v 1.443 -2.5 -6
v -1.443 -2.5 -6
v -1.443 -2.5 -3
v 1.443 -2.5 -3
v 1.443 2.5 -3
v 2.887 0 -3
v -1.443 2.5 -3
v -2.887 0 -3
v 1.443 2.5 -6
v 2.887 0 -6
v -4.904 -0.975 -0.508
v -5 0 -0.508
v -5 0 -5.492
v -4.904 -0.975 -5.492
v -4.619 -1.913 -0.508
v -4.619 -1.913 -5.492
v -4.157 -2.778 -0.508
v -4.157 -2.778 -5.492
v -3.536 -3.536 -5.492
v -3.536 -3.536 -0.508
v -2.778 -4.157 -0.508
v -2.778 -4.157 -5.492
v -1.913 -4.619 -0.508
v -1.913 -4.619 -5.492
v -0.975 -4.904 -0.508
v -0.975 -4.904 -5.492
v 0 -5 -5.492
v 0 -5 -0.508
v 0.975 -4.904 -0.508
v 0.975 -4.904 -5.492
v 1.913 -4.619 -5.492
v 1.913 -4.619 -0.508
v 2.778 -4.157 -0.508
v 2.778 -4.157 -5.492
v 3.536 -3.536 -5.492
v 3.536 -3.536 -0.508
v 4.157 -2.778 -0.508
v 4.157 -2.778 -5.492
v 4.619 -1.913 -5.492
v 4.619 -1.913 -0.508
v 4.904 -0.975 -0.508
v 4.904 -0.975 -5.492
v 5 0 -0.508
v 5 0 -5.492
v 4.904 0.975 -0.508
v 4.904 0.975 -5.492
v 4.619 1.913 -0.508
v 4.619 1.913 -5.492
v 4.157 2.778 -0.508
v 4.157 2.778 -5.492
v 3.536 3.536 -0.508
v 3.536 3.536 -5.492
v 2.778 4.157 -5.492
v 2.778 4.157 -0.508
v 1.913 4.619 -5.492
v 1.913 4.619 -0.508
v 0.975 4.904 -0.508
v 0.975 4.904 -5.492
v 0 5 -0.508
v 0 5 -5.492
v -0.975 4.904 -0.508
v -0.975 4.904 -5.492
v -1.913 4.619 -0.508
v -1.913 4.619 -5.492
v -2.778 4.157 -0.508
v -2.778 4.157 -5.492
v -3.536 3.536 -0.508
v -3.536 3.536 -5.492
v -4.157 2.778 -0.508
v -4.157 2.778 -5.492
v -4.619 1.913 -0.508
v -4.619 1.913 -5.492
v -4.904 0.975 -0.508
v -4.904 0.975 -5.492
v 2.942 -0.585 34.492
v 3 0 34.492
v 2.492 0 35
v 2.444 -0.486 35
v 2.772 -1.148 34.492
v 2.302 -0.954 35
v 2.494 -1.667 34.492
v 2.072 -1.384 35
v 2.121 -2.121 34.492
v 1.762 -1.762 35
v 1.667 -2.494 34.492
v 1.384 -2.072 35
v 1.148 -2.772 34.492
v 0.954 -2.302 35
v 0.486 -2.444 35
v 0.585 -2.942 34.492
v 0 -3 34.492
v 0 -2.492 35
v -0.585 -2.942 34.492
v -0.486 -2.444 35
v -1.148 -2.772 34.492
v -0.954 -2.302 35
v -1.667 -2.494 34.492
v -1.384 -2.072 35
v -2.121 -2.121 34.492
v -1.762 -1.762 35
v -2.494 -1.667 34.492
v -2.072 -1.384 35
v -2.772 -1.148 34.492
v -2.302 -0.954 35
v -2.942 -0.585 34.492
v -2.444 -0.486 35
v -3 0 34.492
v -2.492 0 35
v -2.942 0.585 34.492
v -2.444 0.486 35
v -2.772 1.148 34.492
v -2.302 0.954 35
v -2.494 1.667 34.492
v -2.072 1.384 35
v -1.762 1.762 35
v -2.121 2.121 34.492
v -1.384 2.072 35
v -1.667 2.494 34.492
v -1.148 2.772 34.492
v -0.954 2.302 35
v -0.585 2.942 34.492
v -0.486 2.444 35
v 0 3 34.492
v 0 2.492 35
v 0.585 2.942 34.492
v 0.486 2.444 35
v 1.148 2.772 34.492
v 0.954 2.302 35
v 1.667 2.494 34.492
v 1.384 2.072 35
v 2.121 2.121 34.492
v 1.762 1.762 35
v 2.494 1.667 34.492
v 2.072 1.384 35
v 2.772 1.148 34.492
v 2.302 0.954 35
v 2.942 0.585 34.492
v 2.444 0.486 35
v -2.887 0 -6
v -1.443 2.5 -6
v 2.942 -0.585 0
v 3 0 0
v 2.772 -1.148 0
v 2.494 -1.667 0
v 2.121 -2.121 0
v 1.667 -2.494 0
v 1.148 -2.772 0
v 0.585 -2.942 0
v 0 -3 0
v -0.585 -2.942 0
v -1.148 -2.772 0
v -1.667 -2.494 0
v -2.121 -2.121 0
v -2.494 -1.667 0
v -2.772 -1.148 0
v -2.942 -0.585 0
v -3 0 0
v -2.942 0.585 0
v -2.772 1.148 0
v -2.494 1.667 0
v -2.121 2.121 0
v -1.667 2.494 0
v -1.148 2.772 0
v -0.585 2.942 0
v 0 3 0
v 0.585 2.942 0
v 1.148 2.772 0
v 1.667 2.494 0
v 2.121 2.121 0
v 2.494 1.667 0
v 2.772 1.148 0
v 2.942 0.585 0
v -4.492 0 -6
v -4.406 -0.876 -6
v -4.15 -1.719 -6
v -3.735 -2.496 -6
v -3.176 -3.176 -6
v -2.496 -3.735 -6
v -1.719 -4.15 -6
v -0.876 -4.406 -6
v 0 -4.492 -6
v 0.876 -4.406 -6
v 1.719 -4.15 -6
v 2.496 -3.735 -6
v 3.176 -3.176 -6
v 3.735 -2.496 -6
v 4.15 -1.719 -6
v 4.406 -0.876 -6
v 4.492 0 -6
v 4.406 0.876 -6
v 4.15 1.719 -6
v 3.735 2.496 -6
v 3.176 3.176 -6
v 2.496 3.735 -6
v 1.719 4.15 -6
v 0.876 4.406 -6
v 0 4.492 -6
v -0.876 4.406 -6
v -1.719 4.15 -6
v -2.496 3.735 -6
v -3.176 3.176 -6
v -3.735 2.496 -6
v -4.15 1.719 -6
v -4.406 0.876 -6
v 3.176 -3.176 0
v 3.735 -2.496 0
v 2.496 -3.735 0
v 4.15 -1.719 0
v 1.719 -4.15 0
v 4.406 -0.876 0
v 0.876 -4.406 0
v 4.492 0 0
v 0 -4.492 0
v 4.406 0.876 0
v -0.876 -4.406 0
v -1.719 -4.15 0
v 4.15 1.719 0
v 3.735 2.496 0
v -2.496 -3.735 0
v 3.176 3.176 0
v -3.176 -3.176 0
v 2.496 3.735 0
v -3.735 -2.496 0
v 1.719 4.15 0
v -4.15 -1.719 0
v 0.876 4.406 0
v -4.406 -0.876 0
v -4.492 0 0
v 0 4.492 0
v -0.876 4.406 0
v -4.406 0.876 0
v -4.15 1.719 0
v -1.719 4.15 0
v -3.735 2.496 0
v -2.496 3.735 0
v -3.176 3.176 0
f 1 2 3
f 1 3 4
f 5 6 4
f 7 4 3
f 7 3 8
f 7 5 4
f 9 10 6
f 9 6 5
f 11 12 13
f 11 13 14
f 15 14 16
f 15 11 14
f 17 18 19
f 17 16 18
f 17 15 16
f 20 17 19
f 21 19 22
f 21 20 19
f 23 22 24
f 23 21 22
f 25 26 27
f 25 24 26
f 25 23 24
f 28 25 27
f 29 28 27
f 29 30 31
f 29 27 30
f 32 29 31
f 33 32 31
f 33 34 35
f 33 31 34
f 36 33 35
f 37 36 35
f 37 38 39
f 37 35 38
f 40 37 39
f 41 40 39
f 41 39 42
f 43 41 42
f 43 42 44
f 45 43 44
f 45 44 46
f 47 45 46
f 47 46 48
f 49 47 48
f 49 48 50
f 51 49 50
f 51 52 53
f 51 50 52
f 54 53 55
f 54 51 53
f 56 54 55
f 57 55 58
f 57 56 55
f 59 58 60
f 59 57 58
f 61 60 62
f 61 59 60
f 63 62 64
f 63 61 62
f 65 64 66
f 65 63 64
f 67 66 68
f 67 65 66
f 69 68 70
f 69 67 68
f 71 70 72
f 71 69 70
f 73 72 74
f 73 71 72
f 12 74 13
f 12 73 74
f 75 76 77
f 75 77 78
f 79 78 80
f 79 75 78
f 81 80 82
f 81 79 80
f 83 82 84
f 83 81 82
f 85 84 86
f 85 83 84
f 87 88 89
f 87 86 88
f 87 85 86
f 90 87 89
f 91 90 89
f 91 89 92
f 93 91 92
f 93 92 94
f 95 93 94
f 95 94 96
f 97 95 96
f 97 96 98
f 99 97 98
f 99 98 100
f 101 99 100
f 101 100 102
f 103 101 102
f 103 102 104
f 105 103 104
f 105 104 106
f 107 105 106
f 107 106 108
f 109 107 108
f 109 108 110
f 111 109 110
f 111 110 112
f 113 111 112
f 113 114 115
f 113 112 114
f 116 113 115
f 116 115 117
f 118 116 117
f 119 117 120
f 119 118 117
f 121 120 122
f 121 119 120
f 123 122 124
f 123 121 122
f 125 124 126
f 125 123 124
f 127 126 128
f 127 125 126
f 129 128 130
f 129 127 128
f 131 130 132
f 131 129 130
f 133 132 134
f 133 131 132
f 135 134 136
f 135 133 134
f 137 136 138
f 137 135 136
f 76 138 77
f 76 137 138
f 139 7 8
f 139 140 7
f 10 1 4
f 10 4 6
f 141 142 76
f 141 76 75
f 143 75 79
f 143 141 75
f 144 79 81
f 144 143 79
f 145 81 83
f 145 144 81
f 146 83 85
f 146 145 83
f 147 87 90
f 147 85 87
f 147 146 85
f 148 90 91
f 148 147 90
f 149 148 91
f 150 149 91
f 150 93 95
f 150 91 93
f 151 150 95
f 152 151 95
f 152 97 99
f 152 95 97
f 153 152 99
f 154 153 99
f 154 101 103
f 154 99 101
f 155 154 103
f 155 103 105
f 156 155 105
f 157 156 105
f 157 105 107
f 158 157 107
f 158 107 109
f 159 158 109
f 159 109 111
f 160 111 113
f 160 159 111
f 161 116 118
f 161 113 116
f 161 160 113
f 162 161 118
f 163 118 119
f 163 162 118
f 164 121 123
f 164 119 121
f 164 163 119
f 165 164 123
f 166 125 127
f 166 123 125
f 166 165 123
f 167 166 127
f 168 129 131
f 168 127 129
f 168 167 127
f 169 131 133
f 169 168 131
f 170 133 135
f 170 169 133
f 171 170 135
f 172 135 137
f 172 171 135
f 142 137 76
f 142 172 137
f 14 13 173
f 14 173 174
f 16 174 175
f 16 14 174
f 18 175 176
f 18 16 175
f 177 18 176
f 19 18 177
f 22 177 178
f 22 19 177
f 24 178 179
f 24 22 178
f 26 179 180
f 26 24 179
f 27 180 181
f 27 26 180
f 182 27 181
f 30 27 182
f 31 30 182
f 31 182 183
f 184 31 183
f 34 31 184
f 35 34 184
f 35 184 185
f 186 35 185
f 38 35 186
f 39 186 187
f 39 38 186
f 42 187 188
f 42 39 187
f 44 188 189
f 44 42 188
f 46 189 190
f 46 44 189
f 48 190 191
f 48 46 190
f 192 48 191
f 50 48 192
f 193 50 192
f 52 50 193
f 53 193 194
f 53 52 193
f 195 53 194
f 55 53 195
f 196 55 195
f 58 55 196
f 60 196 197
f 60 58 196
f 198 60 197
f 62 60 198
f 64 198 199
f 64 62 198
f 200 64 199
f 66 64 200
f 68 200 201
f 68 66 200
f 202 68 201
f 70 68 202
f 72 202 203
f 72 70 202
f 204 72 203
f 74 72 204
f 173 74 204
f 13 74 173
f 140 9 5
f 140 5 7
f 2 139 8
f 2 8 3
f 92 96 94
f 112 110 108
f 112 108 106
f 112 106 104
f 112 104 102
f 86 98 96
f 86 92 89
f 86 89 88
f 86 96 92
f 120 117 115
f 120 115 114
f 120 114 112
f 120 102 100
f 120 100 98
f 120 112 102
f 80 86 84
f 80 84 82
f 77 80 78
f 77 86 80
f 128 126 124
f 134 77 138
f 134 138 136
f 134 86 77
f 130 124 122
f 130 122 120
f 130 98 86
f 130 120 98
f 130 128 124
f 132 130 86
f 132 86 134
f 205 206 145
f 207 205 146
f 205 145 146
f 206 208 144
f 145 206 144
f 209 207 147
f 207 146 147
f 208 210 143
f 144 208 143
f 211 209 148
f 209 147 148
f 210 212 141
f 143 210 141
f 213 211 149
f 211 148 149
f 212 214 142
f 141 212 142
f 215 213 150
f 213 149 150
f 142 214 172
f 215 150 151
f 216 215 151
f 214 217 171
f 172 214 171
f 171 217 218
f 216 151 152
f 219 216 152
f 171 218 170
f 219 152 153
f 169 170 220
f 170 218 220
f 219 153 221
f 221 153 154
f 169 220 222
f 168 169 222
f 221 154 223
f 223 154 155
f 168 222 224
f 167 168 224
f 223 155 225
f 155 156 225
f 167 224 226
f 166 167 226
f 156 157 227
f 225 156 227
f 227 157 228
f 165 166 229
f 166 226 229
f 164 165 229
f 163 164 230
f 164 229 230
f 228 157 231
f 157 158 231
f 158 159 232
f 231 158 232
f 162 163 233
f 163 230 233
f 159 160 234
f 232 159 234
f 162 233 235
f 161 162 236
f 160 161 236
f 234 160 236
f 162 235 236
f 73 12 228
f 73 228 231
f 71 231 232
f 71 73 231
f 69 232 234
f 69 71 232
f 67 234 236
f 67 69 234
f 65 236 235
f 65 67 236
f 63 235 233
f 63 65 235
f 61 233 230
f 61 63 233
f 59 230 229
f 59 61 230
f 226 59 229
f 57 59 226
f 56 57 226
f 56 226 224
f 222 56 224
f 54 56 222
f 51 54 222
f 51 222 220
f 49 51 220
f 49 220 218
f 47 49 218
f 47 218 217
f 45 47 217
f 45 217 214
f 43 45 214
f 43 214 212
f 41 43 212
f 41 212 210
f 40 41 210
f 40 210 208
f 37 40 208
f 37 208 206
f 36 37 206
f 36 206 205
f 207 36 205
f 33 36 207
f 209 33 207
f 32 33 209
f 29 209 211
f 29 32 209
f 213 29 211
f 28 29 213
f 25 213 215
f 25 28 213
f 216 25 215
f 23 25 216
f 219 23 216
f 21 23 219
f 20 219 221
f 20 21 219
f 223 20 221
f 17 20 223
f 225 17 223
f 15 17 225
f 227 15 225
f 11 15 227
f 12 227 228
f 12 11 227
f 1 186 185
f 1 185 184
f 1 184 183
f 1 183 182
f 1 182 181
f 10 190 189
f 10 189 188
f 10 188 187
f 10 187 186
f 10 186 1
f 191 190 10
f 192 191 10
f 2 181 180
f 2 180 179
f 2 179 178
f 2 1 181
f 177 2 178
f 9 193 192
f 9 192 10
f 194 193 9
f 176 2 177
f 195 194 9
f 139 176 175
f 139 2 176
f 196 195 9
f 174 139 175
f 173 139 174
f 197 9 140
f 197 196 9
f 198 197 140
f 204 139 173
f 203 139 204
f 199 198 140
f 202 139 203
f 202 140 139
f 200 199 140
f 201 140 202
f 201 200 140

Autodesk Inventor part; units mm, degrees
ref_plane "YZ Plane" through (0, 0, 0) normal (1, 0, 0) x (0, 1, 0)
ref_plane "XZ Plane" through (0, 0, 0) normal (0, 1, 0) x (-1, 0, 0)
ref_plane "XY Plane" through (0, 0, 0) normal (0, 0, 1) x (1, 0, 0)
sketch "Sketch1" plane through (0, 0, 0) normal (0, 0, 1) x (1, 0, 0)
  circle A0 centre (0, 0) radius 3
  dimension "d0" = 6
extrude "Extrusion1" add sketch "Sketch1" along normal blind 35
sketch "Sketch2" plane through (0, 0, 0) normal (0, 0, -1) x (-1, 0, 0)
  circle A0 centre (0, 0) radius 3 projected
  circle A1 centre (0, 0) radius 5
  dimension "d3" = 10
extrude "Extrusion2" add sketch "Sketch2" along normal blind 6 contours A0 | A1
sketch "Sketch3" plane through (0, 0, -6) normal (0, 0, -1) x (-1, 0, 0)
  circle A0 centre (0, 0) radius 5 projected
  line L0 (-1.4434, 2.5) -> (1.4434, 2.5)
  line L1 (1.4434, 2.5) -> (2.8868, 0)
  line L2 (2.8868, 0) -> (1.4434, -2.5)
  line L3 (1.4434, -2.5) -> (-1.4434, -2.5)
  line L4 (-1.4434, -2.5) -> (-2.8868, 0)
  line L5 (-2.8868, 0) -> (-1.4434, 2.5)
  dimension "d6" = 5
extrude "Extrusion3" cut sketch "Sketch3" against normal blind 3 contours L0 L1 L2 L3 L4 L5
thread "Thread1" size "M6x1" class "6g" standard "ANSI Metric M Profile" full length
chamfer "Chamfer1" distance 0.508 angle 45 3 edges at (5, 0, -6) (5, 0, 0) (-3, 0, 35)
properties part number "M6 x 12mm" material "Steel"
